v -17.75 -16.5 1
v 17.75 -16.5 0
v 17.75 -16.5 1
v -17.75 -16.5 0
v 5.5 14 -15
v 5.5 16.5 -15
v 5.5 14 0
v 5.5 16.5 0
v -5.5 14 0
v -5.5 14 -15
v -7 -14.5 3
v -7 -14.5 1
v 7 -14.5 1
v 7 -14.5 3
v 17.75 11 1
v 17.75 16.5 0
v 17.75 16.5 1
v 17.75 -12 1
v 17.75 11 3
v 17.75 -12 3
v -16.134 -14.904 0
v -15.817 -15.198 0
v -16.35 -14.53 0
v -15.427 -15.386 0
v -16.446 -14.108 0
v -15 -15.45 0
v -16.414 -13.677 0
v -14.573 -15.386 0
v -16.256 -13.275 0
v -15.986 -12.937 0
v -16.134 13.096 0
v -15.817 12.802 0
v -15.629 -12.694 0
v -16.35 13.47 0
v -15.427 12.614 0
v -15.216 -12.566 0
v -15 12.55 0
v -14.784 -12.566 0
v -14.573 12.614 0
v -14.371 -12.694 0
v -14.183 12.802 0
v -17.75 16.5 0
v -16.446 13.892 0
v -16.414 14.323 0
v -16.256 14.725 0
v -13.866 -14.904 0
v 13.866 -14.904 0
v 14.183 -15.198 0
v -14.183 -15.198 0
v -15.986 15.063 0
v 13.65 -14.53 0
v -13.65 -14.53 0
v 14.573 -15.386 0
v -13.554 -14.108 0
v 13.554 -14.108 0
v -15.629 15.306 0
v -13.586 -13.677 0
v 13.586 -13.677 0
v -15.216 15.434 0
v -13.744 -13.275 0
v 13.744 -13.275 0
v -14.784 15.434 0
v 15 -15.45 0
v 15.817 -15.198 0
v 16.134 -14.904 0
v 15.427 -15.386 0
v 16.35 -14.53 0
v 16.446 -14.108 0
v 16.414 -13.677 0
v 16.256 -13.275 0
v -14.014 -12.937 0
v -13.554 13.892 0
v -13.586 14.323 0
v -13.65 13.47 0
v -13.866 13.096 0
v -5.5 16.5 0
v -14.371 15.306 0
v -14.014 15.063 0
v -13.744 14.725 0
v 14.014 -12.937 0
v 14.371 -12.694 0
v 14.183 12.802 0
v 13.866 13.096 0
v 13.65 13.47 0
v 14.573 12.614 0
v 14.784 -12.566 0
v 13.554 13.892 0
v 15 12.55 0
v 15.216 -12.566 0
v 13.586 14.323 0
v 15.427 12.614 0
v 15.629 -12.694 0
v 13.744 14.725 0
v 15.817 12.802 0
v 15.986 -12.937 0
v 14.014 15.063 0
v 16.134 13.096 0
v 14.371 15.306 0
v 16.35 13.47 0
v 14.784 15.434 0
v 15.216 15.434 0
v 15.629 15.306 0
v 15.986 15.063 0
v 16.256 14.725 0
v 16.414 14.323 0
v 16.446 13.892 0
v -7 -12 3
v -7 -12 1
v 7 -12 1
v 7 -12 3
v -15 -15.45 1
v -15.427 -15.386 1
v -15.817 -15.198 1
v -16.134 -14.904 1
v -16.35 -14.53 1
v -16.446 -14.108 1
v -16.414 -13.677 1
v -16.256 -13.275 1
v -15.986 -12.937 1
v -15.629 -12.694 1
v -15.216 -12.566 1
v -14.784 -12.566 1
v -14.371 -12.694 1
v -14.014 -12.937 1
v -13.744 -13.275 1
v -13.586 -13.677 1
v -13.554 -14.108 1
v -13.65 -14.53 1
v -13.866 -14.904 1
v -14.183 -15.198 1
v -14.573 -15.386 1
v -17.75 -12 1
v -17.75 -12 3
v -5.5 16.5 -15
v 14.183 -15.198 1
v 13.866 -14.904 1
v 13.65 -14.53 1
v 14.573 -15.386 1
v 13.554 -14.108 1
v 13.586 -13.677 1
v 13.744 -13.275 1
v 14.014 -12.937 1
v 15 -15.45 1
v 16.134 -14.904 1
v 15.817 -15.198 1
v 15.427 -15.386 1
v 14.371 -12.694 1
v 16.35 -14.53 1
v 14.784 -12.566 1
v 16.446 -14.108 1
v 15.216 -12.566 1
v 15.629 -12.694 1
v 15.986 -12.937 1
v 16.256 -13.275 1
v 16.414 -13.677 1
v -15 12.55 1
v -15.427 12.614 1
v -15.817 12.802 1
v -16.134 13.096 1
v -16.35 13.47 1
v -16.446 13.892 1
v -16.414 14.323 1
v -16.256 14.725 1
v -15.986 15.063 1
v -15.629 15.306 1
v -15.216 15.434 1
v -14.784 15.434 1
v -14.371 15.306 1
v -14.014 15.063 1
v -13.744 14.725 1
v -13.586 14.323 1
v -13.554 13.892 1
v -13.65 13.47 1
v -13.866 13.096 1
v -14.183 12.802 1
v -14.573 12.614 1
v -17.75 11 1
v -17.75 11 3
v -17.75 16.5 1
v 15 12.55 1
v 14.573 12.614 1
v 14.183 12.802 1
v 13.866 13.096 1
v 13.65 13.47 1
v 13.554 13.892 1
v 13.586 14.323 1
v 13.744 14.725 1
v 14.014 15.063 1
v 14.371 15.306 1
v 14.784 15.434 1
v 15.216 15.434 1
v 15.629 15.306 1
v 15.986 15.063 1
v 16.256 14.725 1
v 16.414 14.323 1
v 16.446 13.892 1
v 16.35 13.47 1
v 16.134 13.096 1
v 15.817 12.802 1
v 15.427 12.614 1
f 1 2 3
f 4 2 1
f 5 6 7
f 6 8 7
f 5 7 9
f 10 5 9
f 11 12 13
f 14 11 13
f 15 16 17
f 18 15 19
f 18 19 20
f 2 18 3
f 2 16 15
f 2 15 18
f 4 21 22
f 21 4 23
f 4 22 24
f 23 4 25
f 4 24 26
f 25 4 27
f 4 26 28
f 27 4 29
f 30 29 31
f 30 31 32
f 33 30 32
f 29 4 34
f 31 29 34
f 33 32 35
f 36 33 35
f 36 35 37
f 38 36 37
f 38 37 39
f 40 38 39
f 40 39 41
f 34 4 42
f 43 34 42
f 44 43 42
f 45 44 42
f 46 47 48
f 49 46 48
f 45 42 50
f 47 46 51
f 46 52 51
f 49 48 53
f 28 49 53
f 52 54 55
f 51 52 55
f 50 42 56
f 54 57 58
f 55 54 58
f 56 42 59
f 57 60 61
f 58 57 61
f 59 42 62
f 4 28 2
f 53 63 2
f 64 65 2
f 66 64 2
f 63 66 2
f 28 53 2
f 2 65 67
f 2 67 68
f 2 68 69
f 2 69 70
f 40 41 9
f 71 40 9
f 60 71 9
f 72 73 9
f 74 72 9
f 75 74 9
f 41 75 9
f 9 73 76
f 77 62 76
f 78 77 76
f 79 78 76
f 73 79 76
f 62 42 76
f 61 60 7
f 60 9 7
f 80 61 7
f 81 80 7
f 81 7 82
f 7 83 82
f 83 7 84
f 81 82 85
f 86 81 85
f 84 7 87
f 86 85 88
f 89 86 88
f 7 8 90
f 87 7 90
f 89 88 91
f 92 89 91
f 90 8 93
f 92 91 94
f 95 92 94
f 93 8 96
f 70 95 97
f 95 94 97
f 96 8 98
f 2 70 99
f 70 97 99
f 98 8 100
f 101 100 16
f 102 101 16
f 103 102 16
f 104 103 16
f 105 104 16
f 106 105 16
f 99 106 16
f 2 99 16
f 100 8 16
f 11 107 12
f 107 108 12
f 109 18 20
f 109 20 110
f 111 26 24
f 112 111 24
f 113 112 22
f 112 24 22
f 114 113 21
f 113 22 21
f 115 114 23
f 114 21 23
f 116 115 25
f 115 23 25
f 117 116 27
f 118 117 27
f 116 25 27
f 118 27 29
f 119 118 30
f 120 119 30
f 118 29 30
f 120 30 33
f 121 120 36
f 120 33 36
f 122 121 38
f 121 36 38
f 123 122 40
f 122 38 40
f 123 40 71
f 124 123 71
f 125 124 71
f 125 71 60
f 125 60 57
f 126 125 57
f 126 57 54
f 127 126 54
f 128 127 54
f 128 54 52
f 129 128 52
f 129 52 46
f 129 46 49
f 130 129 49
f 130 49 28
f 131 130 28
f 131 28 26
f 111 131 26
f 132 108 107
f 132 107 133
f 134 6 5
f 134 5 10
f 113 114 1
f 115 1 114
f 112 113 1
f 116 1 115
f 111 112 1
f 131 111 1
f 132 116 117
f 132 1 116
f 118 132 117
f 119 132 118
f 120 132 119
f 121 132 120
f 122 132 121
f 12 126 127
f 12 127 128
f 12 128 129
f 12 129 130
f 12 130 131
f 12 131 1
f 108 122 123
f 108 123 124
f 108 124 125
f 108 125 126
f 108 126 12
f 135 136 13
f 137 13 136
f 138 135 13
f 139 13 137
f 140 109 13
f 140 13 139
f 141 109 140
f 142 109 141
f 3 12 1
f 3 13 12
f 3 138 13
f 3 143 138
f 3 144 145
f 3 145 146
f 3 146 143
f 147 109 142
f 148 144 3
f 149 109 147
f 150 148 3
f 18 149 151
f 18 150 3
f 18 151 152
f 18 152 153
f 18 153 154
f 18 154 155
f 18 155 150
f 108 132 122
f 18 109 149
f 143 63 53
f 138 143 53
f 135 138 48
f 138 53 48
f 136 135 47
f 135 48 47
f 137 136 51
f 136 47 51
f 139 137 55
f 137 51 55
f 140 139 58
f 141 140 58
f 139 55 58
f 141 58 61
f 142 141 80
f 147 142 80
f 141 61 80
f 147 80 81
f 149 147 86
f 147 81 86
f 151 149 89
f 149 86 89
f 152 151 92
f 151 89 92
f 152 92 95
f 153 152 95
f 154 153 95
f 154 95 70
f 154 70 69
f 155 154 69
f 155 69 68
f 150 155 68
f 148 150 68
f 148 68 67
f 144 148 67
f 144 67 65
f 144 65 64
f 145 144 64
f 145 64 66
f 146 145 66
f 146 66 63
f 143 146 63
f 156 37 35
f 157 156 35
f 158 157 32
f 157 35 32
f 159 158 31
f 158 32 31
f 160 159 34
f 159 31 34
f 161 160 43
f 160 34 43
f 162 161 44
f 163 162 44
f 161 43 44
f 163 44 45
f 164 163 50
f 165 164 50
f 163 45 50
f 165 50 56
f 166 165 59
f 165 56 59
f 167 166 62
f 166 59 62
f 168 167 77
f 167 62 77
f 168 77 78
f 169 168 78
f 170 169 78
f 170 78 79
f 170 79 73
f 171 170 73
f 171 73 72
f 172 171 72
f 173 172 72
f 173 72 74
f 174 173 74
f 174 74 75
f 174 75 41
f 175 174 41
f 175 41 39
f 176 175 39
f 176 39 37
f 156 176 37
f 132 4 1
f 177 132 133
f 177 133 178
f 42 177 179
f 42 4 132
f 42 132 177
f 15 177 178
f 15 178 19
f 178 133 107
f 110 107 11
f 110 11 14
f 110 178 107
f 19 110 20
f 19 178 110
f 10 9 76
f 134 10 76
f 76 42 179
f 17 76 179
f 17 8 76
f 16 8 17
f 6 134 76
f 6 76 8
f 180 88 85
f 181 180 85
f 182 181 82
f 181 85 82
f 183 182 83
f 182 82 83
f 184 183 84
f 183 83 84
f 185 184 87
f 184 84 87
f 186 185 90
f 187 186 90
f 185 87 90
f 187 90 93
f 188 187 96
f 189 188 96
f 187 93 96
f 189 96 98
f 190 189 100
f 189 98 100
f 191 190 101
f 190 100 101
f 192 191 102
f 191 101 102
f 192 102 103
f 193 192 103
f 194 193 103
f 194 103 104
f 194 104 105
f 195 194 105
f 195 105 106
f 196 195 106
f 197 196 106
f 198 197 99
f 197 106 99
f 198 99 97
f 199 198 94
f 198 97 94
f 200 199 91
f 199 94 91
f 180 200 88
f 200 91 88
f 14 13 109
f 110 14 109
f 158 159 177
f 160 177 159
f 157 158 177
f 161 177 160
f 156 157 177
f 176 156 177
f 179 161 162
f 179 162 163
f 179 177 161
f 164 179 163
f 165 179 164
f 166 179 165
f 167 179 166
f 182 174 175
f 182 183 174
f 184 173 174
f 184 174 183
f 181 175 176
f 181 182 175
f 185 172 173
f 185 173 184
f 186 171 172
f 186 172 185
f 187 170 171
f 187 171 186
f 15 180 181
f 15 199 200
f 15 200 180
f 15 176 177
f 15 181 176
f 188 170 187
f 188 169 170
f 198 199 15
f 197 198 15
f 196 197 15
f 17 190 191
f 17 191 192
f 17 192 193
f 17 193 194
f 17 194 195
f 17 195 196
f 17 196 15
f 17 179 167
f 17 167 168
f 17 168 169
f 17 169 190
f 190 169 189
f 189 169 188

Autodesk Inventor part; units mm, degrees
ref_plane "YZ Plane" through (0, 0, 0) normal (1, 0, 0) x (0, 1, 0)
ref_plane "XZ Plane" through (0, 0, 0) normal (0, 1, 0) x (-1, 0, 0)
ref_plane "XY Plane" through (0, 0, 0) normal (0, 0, 1) x (1, 0, 0)
sketch "Skizze1" plane through (0, 0, 0) normal (0, 0, 1) x (1, 0, 0)
  line L0 (-17.75, 16.5) -> (17.75, 16.5)
  line L1 (17.75, 16.5) -> (17.75, -16.5)
  line L2 (17.75, -16.5) -> (-17.75, -16.5)
  line L3 (-17.75, -16.5) -> (-17.75, 16.5)
  line L4 (-17.75, 16.5) -> (17.75, -16.5) construction
  line L5 (17.75, 16.5) -> (-17.75, -16.5) construction
  point P0 (0, 0)
  dimension "d0" = 33
  dimension "d1" = 35.5
extrude "Extrusion1" add sketch "Skizze1" along normal blind 1
sketch "Skizze2" plane through (0, 0, 1) normal (0, 0, 1) x (1, 0, 0)
  line L0 (-17.75, 16.5) -> (-17.75, -16.5) projected
  line L1 (17.75, -16.5) -> (17.75, 16.5) projected
  line L2 (-17.75, 11) -> (17.75, 11)
  line L3 (17.75, 11) -> (17.75, -12)
  line L4 (17.75, -12) -> (-17.75, -12)
  line L5 (-17.75, -12) -> (-17.75, 11)
  line L6 (17.75, 16.5) -> (-17.75, 16.5) projected
  line L7 (-7, -14.5) -> (7, -14.5)
  line L8 (7, -14.5) -> (7, -12)
  line L9 (7, -12) -> (-7, -12)
  line L10 (-7, -12) -> (-7, -14.5)
  line L11 (-7, -14.5) -> (7, -12) construction
  line L12 (7, -14.5) -> (-7, -12) construction
  line L13 (-17.75, -16.5) -> (17.75, -16.5) projected
  point P0 (0, 0)
  point P1 (0, -13.25)
  point P2 (0, -13.25)
  point P3 (17.75, 11)
  point P4 (-17.75, -12)
  point P5 (-7, -12)
  dimension "d4" = 23
  dimension "d5" = 5.5
  dimension "d6" = 14
  dimension "d7" = 2
extrude "Extrusion2" add sketch "Skizze2" along normal blind 2 contours L2 L1 L4 L0 | L4 L8 L7 L10
sketch "Skizze3" plane through (0, 0, 0) normal (0, 0, -1) x (-1, 0, 0)
  line L0 (-17.75, 16.5) -> (17.75, 16.5) projected
  line L1 (-5.5, 14) -> (5.5, 14)
  line L2 (5.5, 14) -> (5.5, 16.5)
  line L3 (5.5, 16.5) -> (-5.5, 16.5)
  line L4 (-5.5, 16.5) -> (-5.5, 14)
  line L5 (-5.5, 14) -> (5.5, 16.5) construction
  line L6 (5.5, 14) -> (-5.5, 16.5) construction
  point P0 (0, 0)
  point P1 (0, 15.25)
  point P2 (0, 15.25)
  dimension "d10" = 11
  dimension "d11" = 2.5
extrude "Extrusion3" add sketch "Skizze3" along normal blind 15
sketch "Skizze4" plane through (0, 0, 1) normal (0, 0, 1) x (1, 0, 0)
  line L0 (-15, 14) -> (15, 14)
  line L1 (15, 14) -> (15, -14)
  line L2 (15, -14) -> (-15, -14)
  line L3 (-15, -14) -> (-15, 14)
  line L4 (-15, 14) -> (15, -14) construction
  line L5 (15, 14) -> (-15, -14) construction
  point P0 (0, 0)
  dimension "d14" = 28
  dimension "d15" = 30
hole "Bohrung1" at (-15, 14, 1) at (15, 14, 1) at (15, -14, 1) at (-15, -14, 1) direction (0, 0, -1) diameter 2.9 end through all clearance for "Flachkopfsenkschraube ISO 2009/7046" size "M2.5" standard "ISO"
properties part number "display" material "Glas"
